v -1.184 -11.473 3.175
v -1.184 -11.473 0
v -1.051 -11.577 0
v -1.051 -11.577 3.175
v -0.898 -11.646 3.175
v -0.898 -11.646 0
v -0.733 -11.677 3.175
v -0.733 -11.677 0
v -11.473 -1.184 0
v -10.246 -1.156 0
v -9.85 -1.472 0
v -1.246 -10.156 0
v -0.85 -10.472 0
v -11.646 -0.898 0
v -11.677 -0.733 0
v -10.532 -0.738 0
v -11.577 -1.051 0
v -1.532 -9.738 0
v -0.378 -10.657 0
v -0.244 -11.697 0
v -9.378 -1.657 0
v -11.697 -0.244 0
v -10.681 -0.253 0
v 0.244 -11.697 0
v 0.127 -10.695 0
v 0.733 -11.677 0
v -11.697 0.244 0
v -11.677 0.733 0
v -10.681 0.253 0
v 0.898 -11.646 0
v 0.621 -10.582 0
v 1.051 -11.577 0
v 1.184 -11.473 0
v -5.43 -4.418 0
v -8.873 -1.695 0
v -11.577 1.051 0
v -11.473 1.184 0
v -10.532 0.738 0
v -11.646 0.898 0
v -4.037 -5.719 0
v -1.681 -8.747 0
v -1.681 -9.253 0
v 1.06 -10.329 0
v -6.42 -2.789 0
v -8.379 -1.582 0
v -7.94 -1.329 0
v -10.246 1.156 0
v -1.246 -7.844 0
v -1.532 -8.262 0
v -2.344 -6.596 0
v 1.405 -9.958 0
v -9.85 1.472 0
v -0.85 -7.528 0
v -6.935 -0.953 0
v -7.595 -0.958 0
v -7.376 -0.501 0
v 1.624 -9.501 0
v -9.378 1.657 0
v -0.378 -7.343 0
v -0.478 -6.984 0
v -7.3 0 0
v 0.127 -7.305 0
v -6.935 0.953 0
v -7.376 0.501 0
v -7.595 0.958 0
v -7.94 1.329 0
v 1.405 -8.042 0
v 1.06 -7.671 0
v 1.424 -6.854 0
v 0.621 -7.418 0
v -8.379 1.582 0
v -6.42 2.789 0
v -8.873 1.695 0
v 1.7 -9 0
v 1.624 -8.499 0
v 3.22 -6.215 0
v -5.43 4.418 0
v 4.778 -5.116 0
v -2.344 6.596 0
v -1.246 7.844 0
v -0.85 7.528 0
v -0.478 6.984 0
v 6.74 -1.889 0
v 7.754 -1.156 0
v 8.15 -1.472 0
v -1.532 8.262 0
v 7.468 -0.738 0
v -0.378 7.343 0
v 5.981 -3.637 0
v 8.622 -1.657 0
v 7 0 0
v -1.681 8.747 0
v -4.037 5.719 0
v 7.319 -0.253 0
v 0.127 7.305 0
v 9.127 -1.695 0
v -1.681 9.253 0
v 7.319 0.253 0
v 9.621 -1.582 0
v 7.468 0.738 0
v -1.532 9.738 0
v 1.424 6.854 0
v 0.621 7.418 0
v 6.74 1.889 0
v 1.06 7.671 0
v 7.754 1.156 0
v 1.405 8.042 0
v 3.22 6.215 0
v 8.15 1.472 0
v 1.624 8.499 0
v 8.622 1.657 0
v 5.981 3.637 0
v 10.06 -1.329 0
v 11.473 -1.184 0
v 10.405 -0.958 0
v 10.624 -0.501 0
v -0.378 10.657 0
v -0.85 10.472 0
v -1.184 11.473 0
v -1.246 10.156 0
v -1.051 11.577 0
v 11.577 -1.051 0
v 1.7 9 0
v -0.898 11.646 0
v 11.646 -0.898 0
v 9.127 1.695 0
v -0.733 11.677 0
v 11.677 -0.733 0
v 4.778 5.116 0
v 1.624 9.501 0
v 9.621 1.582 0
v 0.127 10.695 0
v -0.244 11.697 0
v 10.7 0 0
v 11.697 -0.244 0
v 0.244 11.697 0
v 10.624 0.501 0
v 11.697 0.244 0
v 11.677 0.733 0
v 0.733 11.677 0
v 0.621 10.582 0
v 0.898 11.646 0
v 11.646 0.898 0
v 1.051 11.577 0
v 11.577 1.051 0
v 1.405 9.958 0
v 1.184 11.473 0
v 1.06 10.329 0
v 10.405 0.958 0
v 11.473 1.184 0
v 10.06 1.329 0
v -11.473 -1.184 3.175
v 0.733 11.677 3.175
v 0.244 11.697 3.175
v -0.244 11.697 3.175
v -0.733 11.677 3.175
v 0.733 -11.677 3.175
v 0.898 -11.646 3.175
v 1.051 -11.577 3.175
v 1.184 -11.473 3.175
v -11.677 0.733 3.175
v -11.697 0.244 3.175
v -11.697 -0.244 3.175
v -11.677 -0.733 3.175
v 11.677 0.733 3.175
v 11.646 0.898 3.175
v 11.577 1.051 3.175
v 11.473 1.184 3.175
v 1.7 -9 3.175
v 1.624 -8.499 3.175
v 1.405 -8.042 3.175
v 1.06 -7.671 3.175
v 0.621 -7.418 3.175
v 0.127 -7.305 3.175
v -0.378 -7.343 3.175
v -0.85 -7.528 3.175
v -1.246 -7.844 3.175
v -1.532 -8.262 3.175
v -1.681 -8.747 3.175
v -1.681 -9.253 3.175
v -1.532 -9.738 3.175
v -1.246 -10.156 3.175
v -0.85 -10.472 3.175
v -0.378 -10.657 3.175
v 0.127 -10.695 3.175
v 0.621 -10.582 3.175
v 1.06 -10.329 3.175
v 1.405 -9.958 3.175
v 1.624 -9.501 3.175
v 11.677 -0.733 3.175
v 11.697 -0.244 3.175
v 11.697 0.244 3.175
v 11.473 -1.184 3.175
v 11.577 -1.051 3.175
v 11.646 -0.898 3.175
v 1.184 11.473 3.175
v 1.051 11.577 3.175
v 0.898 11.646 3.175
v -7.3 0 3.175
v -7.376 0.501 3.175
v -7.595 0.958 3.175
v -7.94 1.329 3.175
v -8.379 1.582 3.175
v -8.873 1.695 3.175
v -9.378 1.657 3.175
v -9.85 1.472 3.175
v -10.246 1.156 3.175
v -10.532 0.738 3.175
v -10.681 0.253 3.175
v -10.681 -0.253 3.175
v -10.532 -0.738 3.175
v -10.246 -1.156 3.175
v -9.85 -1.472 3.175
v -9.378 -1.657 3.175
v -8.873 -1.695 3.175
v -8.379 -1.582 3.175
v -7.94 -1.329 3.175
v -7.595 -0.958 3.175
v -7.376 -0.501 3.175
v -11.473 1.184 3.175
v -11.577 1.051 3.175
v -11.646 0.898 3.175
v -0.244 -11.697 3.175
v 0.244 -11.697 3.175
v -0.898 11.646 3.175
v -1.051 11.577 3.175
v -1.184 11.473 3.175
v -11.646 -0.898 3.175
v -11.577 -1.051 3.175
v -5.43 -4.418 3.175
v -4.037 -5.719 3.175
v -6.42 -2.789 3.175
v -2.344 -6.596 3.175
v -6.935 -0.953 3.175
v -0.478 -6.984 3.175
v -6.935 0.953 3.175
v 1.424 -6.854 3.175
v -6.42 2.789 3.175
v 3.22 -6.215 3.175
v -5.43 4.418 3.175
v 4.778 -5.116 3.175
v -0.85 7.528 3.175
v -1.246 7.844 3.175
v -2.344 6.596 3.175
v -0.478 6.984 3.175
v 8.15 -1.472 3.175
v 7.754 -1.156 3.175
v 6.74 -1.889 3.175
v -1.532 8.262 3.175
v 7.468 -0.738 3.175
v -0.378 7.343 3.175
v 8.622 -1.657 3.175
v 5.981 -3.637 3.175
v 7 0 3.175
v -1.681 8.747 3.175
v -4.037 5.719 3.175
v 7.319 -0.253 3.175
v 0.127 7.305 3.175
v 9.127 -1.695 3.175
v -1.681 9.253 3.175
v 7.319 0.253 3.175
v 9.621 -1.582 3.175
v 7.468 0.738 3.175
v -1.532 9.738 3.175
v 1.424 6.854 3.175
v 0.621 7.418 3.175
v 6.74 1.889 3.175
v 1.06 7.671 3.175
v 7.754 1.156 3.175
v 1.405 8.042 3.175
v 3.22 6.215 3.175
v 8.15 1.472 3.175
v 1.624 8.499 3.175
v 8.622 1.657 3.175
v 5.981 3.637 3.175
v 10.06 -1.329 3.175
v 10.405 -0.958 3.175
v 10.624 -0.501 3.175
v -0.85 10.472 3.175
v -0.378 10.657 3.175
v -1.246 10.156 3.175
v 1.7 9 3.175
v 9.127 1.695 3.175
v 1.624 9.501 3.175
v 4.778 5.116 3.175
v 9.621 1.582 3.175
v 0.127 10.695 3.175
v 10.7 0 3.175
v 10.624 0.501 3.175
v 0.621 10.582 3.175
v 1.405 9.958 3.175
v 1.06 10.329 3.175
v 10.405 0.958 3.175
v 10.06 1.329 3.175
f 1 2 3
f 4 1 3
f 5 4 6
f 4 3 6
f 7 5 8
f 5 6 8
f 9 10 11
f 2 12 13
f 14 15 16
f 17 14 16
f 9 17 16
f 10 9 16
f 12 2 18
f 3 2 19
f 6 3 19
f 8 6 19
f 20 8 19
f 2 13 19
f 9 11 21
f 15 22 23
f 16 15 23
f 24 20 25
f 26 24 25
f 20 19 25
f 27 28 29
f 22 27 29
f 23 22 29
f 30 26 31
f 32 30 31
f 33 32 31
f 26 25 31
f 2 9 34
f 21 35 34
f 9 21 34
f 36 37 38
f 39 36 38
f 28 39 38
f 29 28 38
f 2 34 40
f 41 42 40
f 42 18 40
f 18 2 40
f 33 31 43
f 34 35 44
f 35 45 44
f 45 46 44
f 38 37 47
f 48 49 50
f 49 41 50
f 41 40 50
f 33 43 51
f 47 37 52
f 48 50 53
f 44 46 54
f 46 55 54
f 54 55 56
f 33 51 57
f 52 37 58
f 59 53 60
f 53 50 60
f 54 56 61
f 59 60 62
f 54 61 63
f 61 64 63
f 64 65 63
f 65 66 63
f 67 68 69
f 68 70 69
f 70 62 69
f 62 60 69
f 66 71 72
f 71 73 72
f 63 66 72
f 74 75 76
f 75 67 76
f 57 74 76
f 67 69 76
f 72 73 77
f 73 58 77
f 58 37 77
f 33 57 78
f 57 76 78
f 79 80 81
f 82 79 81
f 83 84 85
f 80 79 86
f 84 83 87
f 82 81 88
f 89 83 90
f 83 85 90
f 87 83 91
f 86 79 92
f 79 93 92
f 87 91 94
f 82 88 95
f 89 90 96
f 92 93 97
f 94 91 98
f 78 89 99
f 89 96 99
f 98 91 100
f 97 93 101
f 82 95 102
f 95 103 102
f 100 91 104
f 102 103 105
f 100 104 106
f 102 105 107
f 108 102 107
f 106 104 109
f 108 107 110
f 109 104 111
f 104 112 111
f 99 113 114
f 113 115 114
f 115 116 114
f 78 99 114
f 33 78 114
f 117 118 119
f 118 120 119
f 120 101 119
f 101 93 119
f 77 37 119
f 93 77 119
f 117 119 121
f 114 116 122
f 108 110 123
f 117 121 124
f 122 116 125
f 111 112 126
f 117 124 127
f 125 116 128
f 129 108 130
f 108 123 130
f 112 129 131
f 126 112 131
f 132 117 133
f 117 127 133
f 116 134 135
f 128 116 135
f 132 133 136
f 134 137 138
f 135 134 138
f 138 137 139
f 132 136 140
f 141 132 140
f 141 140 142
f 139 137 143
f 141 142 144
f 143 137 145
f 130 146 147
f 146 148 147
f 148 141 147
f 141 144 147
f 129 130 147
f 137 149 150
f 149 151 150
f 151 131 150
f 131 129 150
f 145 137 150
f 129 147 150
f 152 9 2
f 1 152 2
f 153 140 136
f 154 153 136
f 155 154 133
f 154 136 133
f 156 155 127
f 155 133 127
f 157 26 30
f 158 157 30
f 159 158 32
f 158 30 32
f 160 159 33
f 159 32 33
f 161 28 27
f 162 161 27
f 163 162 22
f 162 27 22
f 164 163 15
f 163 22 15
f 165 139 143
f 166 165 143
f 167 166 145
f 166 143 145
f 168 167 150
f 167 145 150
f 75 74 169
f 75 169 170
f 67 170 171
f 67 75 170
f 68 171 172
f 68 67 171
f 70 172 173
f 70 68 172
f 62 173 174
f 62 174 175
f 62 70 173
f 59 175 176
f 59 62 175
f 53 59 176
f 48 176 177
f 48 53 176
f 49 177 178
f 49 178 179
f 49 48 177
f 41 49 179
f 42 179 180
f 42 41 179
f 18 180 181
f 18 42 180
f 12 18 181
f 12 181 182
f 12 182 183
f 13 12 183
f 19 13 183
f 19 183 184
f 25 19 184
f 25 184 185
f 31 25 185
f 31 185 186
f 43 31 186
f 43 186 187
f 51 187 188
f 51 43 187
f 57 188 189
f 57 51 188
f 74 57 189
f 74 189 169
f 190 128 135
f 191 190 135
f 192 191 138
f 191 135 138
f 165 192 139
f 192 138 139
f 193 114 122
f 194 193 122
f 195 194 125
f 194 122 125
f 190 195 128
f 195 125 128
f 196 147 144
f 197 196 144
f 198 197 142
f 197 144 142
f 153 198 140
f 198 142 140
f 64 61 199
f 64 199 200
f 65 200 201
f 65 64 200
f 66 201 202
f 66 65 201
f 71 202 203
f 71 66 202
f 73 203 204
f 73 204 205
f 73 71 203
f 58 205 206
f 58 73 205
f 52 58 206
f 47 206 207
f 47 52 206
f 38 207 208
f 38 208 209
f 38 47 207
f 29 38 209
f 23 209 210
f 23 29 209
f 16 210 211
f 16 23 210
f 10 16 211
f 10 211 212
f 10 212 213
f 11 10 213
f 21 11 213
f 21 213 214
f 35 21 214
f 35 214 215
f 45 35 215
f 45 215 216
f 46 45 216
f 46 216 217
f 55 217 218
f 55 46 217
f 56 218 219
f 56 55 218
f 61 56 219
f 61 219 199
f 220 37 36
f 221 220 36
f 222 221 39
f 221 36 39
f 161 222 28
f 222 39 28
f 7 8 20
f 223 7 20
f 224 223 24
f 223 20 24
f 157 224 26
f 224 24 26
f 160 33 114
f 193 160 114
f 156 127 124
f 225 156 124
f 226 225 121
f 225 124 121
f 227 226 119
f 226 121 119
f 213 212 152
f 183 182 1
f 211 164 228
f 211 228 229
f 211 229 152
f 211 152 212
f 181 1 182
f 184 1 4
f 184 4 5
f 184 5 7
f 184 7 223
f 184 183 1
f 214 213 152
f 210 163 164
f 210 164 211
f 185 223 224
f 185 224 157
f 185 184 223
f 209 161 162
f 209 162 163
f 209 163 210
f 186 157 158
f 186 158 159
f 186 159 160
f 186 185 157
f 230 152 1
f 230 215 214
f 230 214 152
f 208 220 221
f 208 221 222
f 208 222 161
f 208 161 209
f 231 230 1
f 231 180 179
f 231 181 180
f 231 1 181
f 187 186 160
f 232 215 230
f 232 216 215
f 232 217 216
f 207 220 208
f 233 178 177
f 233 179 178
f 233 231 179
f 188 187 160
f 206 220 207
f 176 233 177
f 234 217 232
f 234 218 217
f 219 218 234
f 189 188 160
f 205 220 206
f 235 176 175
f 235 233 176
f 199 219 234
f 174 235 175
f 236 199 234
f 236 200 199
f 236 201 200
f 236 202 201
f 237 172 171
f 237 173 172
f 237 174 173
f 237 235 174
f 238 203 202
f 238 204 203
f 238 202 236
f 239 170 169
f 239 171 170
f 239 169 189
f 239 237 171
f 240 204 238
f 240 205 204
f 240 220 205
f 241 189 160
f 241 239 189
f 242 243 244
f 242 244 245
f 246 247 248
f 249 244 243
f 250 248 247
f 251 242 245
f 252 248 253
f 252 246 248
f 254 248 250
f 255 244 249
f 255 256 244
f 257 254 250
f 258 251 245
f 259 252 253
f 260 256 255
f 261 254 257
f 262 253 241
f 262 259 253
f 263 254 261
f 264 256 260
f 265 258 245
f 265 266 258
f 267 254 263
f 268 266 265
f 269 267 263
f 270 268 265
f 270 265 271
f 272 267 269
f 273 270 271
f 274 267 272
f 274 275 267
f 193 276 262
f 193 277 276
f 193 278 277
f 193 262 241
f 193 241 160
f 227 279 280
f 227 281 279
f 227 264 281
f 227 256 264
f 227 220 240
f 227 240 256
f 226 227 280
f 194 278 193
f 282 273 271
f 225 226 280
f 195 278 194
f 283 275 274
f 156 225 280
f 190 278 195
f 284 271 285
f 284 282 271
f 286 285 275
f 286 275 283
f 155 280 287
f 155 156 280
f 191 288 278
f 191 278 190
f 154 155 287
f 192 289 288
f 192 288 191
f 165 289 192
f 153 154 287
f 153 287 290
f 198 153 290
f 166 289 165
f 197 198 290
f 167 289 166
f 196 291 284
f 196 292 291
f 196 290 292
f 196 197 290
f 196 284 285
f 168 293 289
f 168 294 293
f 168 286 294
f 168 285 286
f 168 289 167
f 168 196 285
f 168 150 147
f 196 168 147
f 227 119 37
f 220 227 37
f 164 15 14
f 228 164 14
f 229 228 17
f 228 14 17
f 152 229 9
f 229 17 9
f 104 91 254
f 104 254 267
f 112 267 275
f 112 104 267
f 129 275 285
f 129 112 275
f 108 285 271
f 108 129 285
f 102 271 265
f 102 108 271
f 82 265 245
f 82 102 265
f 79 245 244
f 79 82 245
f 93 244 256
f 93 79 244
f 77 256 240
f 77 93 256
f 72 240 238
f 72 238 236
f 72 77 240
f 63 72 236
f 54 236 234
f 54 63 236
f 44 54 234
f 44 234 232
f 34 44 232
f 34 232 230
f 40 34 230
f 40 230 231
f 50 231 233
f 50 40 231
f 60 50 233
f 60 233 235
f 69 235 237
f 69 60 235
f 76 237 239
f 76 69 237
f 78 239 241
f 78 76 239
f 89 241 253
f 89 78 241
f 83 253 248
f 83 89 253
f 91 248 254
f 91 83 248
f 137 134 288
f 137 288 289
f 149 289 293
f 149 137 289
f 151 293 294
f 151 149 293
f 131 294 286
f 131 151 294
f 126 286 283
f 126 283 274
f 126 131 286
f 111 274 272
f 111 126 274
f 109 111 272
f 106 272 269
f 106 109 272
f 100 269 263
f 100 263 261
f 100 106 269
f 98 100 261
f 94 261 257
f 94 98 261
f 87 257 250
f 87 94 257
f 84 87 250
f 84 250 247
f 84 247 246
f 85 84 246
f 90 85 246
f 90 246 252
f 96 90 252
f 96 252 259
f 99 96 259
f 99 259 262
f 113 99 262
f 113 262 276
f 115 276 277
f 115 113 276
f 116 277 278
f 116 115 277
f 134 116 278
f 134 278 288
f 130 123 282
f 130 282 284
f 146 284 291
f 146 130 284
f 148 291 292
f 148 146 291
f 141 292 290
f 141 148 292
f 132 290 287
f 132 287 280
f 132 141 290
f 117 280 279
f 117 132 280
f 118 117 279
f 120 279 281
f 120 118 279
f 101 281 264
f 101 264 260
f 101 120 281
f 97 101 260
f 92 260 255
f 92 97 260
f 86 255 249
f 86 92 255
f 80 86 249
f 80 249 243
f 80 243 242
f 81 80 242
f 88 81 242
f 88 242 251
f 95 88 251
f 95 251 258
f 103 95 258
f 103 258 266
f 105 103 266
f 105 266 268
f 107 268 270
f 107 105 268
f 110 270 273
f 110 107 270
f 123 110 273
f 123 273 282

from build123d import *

# Parameters (mm, degrees)
SKETCH1_R           = 1.7
SKETCH1_R_2         = 7
BOSS_EXTRUDE1_DEPTH = 3.175


with BuildPart() as part:
    # Sketch1 → Boss-Extrude1 (new body)
    with BuildSketch(Plane.XY):
        with BuildLine():
            Line((-1.183826785, 11.473384598), (-11.473384598, 1.183826785))
            ThreePointArc((-11.473384598, 1.183826785), (-11.616416331, 0.976858517), (-11.677035933, 0.732688077))
            ThreePointArc((-11.677035933, 0.732688077), (-11.7, 0), (-11.677035933, -0.732688077))
            ThreePointArc((-11.677035933, -0.732688077), (-11.616416331, -0.976858517), (-11.473384598, -1.183826785))
            Line((-11.473384598, -1.183826785), (-1.183826785, -11.473384598))
            ThreePointArc((-1.183826785, -11.473384598), (-0.976858517, -11.616416331), (-0.732688077, -11.677035933))
            ThreePointArc((-0.732688077, -11.677035933), (0, -11.7), (0.732688077, -11.677035933))
            ThreePointArc((0.732688077, -11.677035933), (0.976858517, -11.616416331), (1.183826785, -11.473384598))
            Line((1.183826785, -11.473384598), (11.473384598, -1.183826785))
            ThreePointArc((11.473384598, -1.183826785), (11.616416331, -0.976858517), (11.677035933, -0.732688077))
            ThreePointArc((11.677035933, -0.732688077), (11.7, 0), (11.677035933, 0.732688077))
            ThreePointArc((11.677035933, 0.732688077), (11.616416331, 0.976858517), (11.473384598, 1.183826785))
            Line((11.473384598, 1.183826785), (1.183826785, 11.473384598))
            ThreePointArc((1.183826785, 11.473384598), (0.976858517, 11.616416331), (0.732688077, 11.677035933))
            ThreePointArc((0.732688077, 11.677035933), (0, 11.7), (-0.732688077, 11.677035933))
            ThreePointArc((-0.732688077, 11.677035933), (-0.976858517, 11.616416331), (-1.183826785, 11.473384598))
        make_face()
        with Locations((0, -9)):
            Circle(SKETCH1_R, mode=Mode.SUBTRACT)
        with Locations((-9, 0)):
            Circle(SKETCH1_R, mode=Mode.SUBTRACT)
        with Locations((0, 9)):
            Circle(SKETCH1_R, mode=Mode.SUBTRACT)
        with Locations((9, 0)):
            Circle(SKETCH1_R, mode=Mode.SUBTRACT)
        Circle(SKETCH1_R_2, mode=Mode.SUBTRACT)
    extrude(amount=BOSS_EXTRUDE1_DEPTH)


solid = part.part
